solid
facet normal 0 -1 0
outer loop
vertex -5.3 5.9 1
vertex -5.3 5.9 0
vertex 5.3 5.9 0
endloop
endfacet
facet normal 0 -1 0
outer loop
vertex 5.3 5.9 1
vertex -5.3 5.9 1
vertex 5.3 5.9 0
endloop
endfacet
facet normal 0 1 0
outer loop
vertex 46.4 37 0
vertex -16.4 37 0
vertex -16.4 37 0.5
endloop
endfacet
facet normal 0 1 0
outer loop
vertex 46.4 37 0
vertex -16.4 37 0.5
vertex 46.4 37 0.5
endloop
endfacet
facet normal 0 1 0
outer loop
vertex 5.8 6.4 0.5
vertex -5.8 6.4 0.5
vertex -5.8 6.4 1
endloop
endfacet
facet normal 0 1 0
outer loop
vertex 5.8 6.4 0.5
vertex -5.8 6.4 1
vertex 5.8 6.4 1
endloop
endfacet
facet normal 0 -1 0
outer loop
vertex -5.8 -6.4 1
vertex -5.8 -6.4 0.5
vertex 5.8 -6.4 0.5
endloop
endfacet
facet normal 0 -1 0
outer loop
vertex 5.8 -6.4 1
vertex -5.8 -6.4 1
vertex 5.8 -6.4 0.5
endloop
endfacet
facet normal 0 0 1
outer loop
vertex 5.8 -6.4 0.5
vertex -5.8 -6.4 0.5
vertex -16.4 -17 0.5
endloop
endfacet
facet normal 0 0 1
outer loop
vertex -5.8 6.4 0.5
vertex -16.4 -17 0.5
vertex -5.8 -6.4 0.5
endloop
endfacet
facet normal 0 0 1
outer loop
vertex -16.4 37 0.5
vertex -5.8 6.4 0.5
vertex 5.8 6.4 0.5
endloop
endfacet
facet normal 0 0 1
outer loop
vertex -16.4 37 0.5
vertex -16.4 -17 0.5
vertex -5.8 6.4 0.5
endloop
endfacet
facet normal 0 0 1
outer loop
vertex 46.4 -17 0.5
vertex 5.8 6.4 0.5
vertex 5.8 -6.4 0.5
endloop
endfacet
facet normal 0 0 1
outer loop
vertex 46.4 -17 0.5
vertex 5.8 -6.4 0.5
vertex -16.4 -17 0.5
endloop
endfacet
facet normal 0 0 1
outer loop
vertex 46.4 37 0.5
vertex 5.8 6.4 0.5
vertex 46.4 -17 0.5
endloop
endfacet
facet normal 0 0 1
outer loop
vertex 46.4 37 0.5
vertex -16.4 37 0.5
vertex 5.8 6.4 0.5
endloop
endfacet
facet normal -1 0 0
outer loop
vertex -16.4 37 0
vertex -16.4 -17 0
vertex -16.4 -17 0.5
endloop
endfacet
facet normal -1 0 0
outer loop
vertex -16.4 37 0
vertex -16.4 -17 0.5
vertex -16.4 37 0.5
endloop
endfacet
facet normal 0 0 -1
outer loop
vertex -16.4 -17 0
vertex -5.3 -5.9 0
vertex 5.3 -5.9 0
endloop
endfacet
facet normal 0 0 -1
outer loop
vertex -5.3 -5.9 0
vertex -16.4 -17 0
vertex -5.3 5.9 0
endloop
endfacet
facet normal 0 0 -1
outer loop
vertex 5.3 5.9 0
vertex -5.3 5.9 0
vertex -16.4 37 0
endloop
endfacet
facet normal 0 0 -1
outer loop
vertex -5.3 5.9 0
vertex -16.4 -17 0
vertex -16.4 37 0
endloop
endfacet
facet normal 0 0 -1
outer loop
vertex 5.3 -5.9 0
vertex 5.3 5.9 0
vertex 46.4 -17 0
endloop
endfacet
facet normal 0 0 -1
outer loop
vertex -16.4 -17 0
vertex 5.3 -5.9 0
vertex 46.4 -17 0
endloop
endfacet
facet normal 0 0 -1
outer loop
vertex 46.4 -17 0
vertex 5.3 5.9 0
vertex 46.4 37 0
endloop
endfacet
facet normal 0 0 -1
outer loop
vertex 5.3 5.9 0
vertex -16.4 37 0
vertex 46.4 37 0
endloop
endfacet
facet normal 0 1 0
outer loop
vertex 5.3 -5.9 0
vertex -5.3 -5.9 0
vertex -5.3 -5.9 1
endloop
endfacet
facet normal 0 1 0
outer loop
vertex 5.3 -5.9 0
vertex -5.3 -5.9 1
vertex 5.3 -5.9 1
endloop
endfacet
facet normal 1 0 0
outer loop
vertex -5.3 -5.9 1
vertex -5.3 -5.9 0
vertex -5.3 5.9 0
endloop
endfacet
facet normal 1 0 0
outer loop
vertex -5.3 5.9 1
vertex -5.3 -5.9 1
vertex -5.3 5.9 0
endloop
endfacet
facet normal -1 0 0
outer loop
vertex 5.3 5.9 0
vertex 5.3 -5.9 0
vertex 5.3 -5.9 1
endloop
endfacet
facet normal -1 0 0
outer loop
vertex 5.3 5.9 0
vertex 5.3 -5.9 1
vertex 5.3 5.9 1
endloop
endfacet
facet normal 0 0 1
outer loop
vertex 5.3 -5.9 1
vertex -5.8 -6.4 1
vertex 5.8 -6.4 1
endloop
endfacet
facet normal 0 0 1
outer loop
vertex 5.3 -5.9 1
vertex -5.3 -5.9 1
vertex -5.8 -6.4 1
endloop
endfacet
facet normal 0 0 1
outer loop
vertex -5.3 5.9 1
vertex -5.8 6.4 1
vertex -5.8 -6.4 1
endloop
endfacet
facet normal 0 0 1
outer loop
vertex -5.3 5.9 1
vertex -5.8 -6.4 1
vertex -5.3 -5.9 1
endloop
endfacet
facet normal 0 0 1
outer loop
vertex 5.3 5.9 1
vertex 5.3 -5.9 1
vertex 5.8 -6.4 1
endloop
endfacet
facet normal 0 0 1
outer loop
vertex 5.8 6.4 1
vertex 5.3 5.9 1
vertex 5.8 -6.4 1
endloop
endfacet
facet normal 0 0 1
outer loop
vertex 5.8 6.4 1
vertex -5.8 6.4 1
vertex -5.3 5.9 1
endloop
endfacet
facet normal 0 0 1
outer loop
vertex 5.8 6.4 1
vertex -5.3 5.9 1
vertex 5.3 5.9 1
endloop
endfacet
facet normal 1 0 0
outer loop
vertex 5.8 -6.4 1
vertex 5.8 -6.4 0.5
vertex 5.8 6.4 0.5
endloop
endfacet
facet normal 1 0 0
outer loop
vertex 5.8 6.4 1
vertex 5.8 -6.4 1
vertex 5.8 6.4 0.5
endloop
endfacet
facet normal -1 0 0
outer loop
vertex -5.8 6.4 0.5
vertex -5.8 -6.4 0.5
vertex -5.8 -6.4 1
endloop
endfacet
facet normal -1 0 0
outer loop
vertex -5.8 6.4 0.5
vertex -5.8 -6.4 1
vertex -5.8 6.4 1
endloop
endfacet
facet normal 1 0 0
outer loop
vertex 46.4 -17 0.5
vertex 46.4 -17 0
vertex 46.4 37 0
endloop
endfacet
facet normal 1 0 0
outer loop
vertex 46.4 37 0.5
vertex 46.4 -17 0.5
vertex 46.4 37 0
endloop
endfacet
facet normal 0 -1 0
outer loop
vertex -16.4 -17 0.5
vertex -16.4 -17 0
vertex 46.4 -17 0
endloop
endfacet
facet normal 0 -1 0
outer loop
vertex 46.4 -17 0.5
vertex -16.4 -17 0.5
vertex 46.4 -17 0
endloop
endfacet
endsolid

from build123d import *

# Parameters (mm, degrees)
F0_W     = 62.8
F0_H     = 54
F0_W_2   = 12.8
F0_H_2   = 14
F0_W_3   = 11.6
F0_H_3   = 12.8
F0_W_4   = 10.6
F0_H_4   = 11.8
F1_DEPTH = 0.5
F2_DEPTH = 1


with BuildPart() as f1:
    # F0 (on Top) → F1 (new body)
    with BuildSketch(Plane.XY):
        with Locations((15, 10)):
            Rectangle(F0_W, F0_H)
        Rectangle(F0_W_2, F0_H_2, mode=Mode.SUBTRACT)
        Rectangle(F0_W_2, F0_H_2)
        Rectangle(F0_W_3, F0_H_3, mode=Mode.SUBTRACT)
        Rectangle(F0_W_3, F0_H_3)
        Rectangle(F0_W_4, F0_H_4, mode=Mode.SUBTRACT)
    extrude(amount=F1_DEPTH)

    # F0 (on Top) → F2 (join)
    with BuildSketch(Plane.XY):
        Rectangle(F0_W_3, F0_H_3)
        Rectangle(F0_W_4, F0_H_4, mode=Mode.SUBTRACT)
    extrude(amount=F2_DEPTH)


solid = f1.part
